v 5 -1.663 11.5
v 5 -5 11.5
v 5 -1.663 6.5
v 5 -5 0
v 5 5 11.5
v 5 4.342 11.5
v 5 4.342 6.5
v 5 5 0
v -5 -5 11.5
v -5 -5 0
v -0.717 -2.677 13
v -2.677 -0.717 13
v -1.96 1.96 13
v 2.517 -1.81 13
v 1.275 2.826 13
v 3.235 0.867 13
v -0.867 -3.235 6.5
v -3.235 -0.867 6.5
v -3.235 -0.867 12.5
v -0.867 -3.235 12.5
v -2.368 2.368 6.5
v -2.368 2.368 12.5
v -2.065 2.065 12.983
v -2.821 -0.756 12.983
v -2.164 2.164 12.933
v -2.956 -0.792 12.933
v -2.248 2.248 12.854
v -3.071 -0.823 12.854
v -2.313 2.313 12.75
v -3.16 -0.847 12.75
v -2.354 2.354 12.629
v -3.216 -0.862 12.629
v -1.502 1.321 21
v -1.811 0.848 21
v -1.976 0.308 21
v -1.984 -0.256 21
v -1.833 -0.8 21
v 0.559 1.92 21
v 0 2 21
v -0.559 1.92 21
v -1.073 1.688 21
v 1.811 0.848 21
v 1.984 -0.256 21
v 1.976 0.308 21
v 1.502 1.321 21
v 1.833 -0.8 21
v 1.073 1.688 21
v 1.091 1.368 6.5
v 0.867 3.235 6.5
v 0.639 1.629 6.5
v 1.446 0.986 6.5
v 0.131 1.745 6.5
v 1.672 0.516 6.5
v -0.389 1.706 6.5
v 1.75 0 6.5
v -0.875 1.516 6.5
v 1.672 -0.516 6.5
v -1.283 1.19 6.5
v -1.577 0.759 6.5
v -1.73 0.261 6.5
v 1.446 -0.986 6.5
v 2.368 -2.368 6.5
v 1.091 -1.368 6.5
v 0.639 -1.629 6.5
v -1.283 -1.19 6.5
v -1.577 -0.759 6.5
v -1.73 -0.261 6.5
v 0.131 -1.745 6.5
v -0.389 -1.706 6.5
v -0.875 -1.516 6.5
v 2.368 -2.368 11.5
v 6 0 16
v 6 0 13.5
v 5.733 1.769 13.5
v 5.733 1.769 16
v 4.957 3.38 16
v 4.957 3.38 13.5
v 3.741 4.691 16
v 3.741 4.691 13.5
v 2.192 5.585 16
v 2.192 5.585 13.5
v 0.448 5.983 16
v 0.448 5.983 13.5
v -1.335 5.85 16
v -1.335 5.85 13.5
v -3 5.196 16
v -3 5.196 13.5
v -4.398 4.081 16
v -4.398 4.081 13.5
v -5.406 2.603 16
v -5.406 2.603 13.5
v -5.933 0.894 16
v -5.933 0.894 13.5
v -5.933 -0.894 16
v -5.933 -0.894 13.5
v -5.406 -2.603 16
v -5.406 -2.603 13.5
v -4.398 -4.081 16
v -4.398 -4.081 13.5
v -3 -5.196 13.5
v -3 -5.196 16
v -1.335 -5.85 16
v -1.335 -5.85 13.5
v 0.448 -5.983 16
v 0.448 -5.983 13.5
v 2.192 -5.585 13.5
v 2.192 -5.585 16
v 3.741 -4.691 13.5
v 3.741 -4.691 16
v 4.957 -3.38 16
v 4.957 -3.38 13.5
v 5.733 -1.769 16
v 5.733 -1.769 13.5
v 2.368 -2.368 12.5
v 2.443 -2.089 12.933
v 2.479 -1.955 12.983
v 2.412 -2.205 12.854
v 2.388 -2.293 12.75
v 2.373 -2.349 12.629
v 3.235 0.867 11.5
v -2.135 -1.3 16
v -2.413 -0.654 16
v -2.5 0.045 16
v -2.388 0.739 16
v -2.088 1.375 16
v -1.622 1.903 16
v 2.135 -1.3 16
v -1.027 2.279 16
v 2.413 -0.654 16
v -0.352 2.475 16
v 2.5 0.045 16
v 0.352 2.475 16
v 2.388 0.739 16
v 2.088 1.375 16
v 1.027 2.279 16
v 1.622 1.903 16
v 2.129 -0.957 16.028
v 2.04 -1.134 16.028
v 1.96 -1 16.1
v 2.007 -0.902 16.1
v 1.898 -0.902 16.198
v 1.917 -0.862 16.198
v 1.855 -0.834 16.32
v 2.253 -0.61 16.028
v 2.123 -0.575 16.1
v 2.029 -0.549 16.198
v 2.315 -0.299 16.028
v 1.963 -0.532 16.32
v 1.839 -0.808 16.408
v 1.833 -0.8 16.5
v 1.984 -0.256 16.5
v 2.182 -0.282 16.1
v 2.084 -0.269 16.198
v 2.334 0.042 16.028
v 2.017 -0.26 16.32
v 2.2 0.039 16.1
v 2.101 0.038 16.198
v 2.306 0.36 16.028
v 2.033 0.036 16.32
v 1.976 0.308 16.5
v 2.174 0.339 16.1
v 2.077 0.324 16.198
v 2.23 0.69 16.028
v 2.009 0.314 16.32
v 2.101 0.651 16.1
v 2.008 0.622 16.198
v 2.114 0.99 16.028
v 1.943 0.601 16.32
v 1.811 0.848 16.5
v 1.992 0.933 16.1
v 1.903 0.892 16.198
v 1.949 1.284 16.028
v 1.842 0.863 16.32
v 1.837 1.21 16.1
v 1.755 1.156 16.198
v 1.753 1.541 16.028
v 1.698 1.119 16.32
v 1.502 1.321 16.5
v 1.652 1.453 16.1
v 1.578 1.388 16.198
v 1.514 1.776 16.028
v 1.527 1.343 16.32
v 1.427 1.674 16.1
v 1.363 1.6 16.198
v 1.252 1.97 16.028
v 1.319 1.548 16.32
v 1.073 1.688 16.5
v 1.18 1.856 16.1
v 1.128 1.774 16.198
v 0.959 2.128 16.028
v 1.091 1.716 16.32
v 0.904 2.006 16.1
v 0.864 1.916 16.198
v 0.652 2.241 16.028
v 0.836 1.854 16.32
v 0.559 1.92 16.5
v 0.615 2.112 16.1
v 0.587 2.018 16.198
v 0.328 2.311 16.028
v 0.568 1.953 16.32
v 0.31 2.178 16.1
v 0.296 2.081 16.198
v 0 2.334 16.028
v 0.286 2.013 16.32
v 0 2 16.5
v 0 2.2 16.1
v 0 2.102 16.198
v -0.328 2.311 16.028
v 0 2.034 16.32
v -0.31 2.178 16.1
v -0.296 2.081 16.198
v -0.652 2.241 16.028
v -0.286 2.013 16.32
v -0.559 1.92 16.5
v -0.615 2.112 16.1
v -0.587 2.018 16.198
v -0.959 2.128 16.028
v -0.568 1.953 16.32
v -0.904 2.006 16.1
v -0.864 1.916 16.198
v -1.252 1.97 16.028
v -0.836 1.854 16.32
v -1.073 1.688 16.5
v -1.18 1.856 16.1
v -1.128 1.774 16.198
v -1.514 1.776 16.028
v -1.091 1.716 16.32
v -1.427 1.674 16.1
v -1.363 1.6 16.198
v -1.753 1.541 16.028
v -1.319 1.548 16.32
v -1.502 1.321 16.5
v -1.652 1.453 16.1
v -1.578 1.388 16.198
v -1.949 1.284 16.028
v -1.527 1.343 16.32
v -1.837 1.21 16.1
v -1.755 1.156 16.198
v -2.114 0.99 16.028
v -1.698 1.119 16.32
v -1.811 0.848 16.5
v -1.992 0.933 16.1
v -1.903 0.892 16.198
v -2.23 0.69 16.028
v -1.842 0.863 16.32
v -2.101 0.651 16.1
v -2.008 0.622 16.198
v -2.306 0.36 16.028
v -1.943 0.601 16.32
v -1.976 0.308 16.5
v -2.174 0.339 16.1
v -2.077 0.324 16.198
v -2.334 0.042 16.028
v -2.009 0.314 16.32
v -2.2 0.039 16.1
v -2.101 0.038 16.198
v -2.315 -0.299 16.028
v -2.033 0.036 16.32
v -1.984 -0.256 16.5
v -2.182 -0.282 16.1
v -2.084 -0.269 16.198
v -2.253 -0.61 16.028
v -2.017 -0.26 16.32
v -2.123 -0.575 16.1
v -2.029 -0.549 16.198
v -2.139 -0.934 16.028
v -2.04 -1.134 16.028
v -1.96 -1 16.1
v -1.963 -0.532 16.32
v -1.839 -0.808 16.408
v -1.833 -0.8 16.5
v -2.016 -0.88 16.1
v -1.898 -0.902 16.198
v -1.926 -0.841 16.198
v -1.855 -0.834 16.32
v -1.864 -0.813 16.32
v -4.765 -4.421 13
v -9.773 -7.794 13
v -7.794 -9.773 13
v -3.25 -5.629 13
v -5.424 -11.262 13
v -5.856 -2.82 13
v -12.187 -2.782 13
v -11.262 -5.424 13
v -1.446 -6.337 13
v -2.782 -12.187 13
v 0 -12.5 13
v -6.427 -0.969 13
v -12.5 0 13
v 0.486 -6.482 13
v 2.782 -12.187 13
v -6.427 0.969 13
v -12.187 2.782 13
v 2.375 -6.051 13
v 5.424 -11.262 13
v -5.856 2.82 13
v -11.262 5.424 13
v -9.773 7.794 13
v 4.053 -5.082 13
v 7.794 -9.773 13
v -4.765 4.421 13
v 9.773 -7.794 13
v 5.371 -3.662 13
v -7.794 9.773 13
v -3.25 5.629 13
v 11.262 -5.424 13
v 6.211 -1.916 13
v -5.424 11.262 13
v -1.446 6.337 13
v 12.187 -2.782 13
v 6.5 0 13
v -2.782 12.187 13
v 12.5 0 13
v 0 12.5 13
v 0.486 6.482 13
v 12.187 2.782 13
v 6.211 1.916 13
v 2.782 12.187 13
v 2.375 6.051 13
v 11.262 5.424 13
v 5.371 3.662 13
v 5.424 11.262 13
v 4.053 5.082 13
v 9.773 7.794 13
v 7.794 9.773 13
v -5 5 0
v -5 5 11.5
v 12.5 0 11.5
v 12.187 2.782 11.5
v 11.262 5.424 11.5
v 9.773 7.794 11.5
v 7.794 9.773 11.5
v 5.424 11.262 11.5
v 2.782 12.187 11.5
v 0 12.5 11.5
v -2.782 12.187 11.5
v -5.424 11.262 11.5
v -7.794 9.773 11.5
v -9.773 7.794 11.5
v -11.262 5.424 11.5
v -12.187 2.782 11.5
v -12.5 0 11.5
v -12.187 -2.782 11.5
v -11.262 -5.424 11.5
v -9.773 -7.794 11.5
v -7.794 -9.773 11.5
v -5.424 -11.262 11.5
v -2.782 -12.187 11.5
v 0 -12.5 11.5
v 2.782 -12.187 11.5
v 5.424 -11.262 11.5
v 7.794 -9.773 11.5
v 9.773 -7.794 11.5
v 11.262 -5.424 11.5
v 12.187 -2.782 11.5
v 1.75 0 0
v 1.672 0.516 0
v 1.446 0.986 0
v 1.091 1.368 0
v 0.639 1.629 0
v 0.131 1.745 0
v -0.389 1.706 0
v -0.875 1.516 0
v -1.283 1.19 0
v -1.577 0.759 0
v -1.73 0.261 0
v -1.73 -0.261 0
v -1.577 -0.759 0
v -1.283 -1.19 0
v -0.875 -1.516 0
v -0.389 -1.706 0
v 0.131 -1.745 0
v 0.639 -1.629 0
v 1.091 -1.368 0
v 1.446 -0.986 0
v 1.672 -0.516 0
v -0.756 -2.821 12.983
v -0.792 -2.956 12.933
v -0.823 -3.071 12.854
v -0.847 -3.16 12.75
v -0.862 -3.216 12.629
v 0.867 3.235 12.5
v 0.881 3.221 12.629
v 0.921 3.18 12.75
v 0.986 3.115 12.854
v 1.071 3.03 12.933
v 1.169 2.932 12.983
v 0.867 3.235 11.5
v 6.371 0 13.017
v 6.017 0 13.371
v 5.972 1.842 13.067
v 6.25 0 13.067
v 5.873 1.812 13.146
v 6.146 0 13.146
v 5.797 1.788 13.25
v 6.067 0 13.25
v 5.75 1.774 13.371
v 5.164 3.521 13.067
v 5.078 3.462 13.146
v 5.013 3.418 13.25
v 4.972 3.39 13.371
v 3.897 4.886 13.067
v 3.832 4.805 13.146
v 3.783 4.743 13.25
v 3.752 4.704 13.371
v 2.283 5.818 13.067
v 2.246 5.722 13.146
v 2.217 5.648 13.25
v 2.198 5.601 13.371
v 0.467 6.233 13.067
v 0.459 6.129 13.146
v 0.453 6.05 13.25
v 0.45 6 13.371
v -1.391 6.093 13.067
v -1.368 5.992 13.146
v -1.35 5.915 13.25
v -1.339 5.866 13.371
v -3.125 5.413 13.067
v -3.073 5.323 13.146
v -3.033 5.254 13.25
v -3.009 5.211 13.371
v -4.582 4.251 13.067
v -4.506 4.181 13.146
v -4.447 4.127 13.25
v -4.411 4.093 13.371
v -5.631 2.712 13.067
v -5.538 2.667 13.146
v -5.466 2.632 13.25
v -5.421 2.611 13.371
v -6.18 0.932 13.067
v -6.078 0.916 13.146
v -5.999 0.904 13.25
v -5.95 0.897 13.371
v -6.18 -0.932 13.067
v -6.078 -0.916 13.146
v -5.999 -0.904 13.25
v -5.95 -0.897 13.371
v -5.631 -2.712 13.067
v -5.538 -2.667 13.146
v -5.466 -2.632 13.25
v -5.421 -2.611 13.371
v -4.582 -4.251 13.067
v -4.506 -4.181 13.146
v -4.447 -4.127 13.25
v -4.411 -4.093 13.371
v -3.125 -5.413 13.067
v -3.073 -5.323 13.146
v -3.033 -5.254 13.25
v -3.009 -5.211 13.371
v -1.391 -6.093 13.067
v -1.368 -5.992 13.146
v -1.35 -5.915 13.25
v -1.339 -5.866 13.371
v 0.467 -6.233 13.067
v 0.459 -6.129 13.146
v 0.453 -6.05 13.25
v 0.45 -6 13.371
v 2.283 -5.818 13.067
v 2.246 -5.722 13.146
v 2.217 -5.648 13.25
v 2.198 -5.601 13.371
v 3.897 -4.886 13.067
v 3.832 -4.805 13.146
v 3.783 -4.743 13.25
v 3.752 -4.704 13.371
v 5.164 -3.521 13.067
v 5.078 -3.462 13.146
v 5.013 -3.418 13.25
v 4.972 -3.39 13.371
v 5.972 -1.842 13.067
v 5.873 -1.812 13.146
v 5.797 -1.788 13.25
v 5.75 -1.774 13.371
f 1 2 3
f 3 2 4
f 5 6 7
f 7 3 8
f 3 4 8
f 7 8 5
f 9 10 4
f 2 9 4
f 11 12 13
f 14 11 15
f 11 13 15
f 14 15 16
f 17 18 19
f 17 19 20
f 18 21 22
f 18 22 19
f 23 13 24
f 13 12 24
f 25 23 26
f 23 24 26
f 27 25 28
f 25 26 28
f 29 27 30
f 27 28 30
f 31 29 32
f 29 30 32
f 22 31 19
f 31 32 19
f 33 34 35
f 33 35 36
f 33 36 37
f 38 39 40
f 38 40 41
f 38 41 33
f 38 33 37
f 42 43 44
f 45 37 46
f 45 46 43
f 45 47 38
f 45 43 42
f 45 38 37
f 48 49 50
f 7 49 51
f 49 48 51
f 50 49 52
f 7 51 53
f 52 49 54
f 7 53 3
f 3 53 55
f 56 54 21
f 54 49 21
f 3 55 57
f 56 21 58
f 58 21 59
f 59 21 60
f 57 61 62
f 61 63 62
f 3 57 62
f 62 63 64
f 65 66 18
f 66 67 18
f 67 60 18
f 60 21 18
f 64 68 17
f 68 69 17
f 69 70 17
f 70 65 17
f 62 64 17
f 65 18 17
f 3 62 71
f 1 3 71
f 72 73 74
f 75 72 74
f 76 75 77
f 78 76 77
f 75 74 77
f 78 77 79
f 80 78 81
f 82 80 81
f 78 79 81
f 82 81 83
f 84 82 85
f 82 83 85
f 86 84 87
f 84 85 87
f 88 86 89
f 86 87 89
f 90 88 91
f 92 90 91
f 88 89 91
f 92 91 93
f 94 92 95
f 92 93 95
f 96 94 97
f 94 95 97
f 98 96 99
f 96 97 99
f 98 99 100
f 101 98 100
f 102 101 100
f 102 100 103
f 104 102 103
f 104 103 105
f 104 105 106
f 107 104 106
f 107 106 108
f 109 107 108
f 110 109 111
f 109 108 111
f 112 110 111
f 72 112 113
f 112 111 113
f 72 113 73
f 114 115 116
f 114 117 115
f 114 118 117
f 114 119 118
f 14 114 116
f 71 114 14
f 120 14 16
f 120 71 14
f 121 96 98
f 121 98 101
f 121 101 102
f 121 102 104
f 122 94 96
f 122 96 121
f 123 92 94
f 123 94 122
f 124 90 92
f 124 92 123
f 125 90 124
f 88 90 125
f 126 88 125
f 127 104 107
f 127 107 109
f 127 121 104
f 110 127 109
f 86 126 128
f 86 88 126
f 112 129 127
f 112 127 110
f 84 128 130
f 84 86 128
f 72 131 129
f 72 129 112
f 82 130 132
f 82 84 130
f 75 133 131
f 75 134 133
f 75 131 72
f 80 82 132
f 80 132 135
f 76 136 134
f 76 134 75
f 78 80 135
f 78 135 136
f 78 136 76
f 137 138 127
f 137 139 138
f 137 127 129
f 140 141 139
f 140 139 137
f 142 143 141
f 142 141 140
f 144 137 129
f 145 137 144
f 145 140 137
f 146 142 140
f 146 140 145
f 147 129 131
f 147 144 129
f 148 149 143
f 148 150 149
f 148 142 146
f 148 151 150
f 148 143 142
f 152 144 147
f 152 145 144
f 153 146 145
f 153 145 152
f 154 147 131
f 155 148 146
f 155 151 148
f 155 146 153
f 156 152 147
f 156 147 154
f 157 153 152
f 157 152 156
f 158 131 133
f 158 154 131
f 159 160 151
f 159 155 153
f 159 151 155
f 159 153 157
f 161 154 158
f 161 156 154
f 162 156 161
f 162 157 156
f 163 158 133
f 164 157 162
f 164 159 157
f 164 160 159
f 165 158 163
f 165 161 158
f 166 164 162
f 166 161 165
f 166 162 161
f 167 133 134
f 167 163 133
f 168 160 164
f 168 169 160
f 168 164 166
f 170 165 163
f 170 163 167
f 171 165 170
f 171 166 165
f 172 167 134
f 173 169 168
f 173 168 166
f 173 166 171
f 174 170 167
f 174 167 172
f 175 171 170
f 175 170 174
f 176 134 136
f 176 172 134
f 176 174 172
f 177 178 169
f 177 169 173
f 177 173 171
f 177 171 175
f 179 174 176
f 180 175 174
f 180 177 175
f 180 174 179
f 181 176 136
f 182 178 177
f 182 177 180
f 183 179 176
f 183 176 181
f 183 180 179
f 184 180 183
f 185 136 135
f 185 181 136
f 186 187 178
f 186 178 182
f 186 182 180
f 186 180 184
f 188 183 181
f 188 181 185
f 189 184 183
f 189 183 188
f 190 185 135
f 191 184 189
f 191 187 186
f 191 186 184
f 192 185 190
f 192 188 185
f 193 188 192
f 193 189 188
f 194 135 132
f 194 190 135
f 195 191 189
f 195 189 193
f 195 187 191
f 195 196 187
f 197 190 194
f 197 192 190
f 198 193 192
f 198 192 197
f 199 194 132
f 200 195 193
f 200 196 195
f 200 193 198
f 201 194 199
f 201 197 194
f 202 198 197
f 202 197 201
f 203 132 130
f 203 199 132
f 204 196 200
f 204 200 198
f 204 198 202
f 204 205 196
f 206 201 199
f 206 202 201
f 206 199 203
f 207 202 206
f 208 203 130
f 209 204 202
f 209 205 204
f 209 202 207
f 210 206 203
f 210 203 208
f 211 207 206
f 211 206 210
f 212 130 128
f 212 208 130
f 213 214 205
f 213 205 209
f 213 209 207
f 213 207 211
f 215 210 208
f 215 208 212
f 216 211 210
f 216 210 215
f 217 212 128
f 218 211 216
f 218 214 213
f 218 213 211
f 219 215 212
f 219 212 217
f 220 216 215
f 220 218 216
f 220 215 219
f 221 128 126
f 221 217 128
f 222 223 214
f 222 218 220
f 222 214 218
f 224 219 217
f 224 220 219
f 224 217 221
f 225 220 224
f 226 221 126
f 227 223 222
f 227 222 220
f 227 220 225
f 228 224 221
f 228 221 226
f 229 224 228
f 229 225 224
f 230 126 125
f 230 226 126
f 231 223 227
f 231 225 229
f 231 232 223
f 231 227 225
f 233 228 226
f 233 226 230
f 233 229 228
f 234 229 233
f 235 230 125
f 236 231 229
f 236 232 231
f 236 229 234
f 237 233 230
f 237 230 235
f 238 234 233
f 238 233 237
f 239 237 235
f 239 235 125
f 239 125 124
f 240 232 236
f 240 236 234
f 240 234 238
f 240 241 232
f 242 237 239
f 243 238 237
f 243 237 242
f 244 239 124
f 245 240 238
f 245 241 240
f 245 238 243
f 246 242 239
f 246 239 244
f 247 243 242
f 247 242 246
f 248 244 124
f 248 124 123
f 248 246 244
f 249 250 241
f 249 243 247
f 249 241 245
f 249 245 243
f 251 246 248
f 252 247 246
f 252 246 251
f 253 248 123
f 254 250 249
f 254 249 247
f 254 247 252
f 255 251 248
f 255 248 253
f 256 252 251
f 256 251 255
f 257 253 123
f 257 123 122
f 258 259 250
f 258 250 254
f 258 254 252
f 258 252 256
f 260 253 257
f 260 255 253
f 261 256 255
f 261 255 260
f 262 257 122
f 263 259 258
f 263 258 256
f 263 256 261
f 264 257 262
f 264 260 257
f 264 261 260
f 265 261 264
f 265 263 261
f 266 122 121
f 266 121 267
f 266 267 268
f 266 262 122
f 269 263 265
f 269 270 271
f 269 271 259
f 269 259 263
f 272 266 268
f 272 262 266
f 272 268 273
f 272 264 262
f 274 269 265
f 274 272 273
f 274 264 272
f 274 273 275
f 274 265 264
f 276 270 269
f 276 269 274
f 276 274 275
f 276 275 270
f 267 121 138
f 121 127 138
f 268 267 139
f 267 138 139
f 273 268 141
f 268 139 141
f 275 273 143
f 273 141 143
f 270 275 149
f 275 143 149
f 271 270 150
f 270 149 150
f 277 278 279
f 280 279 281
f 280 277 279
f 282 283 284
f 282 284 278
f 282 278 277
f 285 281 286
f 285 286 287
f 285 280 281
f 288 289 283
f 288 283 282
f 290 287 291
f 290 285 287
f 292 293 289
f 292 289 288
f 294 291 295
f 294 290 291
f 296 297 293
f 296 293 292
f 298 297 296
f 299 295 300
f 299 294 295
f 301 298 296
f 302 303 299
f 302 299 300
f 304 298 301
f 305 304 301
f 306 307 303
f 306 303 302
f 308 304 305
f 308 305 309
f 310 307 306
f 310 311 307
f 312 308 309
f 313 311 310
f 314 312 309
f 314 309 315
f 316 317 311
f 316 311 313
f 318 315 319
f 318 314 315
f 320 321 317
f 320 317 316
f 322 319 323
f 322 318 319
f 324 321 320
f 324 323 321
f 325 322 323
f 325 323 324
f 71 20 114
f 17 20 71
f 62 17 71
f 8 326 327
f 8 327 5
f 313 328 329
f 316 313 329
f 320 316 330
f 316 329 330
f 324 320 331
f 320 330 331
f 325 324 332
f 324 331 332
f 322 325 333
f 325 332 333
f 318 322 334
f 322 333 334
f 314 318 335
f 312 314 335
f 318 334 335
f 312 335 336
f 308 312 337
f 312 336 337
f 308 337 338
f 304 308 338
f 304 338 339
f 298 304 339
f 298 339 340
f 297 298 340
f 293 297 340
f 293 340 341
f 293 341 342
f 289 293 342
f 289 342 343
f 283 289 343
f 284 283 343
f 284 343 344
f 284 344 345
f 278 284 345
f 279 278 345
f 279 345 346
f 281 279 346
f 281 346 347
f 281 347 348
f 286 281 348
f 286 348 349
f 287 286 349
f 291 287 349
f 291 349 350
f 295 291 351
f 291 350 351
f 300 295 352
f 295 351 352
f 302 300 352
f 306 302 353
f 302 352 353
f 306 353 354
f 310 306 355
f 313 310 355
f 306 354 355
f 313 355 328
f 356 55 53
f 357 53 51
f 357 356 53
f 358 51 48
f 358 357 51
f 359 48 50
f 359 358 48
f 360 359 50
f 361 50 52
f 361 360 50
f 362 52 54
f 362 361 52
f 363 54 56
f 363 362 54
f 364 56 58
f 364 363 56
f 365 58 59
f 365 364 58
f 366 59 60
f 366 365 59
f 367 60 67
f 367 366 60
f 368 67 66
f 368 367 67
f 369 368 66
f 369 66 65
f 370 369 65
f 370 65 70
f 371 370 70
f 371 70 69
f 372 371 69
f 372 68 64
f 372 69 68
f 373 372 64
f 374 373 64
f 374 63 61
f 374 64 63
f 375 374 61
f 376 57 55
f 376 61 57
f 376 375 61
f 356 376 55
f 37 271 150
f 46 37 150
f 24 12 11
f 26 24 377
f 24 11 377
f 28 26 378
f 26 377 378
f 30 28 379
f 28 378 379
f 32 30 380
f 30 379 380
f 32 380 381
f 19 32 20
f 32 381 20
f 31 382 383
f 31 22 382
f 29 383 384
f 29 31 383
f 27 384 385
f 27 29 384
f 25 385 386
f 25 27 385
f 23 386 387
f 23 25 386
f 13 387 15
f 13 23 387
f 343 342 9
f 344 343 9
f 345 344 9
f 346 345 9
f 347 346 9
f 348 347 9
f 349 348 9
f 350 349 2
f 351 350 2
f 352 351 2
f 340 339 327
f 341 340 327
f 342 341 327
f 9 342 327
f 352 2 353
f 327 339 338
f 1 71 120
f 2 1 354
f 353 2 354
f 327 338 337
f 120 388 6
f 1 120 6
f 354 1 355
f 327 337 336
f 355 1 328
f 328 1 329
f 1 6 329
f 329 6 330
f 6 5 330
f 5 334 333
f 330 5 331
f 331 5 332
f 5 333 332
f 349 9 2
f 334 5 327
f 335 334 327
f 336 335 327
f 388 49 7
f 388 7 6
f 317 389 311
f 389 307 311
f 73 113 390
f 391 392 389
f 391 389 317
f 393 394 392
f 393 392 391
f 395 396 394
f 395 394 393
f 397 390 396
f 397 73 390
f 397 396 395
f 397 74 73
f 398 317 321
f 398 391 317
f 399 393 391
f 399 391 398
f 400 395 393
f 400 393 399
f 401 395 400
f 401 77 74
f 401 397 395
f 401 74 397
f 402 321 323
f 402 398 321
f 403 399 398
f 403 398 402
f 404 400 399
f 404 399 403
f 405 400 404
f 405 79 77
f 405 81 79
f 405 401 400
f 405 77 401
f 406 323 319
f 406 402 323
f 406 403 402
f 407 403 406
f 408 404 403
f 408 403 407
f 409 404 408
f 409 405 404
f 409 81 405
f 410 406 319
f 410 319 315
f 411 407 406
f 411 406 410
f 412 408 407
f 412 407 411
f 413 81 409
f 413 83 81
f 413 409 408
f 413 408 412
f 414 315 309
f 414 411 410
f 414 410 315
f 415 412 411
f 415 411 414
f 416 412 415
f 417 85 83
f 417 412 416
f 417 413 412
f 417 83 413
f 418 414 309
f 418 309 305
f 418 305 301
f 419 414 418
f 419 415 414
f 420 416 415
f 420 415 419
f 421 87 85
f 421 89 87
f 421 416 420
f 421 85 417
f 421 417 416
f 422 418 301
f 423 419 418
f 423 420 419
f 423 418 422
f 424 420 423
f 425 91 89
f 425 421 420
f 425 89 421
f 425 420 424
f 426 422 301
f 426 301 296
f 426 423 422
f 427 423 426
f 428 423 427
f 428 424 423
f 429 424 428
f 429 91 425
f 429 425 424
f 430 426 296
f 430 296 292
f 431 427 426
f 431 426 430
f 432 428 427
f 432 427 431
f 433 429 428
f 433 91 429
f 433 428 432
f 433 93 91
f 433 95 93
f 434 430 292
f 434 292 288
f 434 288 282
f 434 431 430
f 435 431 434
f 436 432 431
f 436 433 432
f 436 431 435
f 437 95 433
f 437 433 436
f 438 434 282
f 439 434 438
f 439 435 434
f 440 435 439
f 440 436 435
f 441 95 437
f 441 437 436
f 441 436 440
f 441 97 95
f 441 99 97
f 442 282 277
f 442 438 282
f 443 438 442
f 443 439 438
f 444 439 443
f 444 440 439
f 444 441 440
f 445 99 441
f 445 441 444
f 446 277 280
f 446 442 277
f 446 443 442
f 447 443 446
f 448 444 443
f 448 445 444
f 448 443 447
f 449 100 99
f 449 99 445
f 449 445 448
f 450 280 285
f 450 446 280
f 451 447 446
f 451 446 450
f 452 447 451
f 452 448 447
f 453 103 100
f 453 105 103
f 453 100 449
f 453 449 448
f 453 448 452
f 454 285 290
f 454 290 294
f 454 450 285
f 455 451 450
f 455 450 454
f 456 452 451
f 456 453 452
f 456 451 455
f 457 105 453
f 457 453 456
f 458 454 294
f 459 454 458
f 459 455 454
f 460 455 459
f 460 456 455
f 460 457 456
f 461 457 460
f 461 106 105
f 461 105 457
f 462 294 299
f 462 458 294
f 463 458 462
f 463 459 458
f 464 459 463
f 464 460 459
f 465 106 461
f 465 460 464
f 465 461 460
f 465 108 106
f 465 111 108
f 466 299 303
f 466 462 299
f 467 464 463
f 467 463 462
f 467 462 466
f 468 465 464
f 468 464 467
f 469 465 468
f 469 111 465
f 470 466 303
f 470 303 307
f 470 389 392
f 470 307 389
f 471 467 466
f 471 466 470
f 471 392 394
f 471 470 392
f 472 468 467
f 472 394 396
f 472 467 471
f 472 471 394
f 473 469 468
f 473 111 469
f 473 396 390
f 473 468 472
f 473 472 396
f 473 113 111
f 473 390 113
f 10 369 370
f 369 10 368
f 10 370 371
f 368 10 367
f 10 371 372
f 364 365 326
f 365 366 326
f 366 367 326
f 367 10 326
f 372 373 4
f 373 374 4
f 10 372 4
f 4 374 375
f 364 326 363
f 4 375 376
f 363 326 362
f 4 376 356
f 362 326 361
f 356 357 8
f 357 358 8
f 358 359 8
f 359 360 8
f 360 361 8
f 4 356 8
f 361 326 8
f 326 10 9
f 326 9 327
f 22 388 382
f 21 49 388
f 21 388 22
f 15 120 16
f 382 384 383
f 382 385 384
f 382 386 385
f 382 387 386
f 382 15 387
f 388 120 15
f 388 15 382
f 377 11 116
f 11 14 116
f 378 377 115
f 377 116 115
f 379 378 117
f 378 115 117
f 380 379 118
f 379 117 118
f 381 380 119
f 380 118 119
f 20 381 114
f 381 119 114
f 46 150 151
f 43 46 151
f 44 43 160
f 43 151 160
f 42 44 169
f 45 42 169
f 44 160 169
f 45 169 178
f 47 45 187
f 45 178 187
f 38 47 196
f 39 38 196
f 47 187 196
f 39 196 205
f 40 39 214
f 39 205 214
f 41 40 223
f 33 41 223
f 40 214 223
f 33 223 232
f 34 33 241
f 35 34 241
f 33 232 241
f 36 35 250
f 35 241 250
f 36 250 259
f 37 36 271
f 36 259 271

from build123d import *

# Parameters (mm, degrees)
SKETCH3_W           = 10
SKETCH3_H           = 10
SKETCH3_R           = 1.75
BOSS_EXTRUDE4_DEPTH = 11.5
CUT_EXTRUDE1_START  = 11.5
CUT_EXTRUDE1_DEPTH  = 5
SKETCH4_R           = 12.5
BOSS_EXTRUDE5_DEPTH = 1.5
SKETCH5_W           = 5
SKETCH5_H           = 5.8
CUT_EXTRUDE2_DEPTH  = 14.634995112
SKETCH6_R           = 6
BOSS_EXTRUDE6_DEPTH = 3
FILLET1_R           = 0.5
FILLET2_R           = 0.5
BOSS_EXTRUDE7_DEPTH = 5
FILLET3_R           = 0.5


with BuildPart() as part:
    # Sketch3 → Boss-Extrude4 (new body)
    with BuildSketch(Plane.XY):
        Rectangle(SKETCH3_W, SKETCH3_H)
        Circle(SKETCH3_R, mode=Mode.SUBTRACT)
    extrude(amount=BOSS_EXTRUDE4_DEPTH)

    # Sketch3<3> → Cut-Extrude1 (cut)
    with BuildSketch(Plane.XY.offset(CUT_EXTRUDE1_START)):
        Polygon((3.234529708, 0.866689623), (0.866689623, 3.234529708), (-2.367840085, 2.367840085), (-3.234529708, -0.866689623), (-0.866689623, -3.234529708), (2.367840085, -2.367840085), align=None)
    extrude(amount=-CUT_EXTRUDE1_DEPTH, mode=Mode.SUBTRACT)

    # Sketch4 → Boss-Extrude5 (add)
    with BuildSketch(Plane.XY.offset(11.5)):
        Circle(SKETCH4_R)
        Polygon((3.234529708, 0.866689623), (0.866689623, 3.234529708), (-2.367840085, 2.367840085), (-3.234529708, -0.866689623), (-0.866689623, -3.234529708), (2.367840085, -2.367840085), align=None, mode=Mode.SUBTRACT)
    extrude(amount=BOSS_EXTRUDE5_DEPTH)

    # Sketch5 → Cut-Extrude2 (cut, through all)
    with BuildSketch(Plane(origin=(2.92867424, -4.460901648, 0), x_dir=(0, 0, 1), z_dir=(0.965925826, 0.258819045, 0))):
        with Locations((9, -5.066896781)):
            Rectangle(SKETCH5_W, SKETCH5_H)
    extrude(amount=CUT_EXTRUDE2_DEPTH, mode=Mode.SUBTRACT)

    # Sketch6 → Boss-Extrude6 (add)
    with BuildSketch(Plane.XY.offset(13)):
        Circle(SKETCH6_R)
    extrude(amount=BOSS_EXTRUDE6_DEPTH)

    # Fillet1
    fillet1_edges = [part.edges().sort_by_distance(p)[0] for p in [
        (-0.750575231, 2.801184896, 13),
        (-2.801184896, 0.750575231, 13),
        (-2.050609665, -2.050609665, 13),
        (0.750575231, -2.801184896, 13),
    ]]
    fillet(fillet1_edges, radius=FILLET1_R)

    # Fillet2
    fillet2_edges = [part.edges().sort_by_distance(p)[0] for p in [
        (-6, 0, 13),
    ]]
    fillet(fillet2_edges, radius=FILLET2_R)

    # Sketch7 → Boss-Extrude7 (add)
    with BuildSketch(Plane.XY.offset(16)):
        with BuildLine():
            Line((-1.833030278, -0.8), (1.833030278, -0.8))
            ThreePointArc((1.833030278, -0.8), (0, 2), (-1.833030278, -0.8))
        make_face()
    extrude(amount=BOSS_EXTRUDE7_DEPTH)

    # Fillet3
    fillet3_edges = [part.edges().sort_by_distance(p)[0] for p in [
        (0, 2, 16),
        (0, -0.8, 16),
    ]]
    fillet(fillet3_edges, radius=FILLET3_R)


solid = part.part
